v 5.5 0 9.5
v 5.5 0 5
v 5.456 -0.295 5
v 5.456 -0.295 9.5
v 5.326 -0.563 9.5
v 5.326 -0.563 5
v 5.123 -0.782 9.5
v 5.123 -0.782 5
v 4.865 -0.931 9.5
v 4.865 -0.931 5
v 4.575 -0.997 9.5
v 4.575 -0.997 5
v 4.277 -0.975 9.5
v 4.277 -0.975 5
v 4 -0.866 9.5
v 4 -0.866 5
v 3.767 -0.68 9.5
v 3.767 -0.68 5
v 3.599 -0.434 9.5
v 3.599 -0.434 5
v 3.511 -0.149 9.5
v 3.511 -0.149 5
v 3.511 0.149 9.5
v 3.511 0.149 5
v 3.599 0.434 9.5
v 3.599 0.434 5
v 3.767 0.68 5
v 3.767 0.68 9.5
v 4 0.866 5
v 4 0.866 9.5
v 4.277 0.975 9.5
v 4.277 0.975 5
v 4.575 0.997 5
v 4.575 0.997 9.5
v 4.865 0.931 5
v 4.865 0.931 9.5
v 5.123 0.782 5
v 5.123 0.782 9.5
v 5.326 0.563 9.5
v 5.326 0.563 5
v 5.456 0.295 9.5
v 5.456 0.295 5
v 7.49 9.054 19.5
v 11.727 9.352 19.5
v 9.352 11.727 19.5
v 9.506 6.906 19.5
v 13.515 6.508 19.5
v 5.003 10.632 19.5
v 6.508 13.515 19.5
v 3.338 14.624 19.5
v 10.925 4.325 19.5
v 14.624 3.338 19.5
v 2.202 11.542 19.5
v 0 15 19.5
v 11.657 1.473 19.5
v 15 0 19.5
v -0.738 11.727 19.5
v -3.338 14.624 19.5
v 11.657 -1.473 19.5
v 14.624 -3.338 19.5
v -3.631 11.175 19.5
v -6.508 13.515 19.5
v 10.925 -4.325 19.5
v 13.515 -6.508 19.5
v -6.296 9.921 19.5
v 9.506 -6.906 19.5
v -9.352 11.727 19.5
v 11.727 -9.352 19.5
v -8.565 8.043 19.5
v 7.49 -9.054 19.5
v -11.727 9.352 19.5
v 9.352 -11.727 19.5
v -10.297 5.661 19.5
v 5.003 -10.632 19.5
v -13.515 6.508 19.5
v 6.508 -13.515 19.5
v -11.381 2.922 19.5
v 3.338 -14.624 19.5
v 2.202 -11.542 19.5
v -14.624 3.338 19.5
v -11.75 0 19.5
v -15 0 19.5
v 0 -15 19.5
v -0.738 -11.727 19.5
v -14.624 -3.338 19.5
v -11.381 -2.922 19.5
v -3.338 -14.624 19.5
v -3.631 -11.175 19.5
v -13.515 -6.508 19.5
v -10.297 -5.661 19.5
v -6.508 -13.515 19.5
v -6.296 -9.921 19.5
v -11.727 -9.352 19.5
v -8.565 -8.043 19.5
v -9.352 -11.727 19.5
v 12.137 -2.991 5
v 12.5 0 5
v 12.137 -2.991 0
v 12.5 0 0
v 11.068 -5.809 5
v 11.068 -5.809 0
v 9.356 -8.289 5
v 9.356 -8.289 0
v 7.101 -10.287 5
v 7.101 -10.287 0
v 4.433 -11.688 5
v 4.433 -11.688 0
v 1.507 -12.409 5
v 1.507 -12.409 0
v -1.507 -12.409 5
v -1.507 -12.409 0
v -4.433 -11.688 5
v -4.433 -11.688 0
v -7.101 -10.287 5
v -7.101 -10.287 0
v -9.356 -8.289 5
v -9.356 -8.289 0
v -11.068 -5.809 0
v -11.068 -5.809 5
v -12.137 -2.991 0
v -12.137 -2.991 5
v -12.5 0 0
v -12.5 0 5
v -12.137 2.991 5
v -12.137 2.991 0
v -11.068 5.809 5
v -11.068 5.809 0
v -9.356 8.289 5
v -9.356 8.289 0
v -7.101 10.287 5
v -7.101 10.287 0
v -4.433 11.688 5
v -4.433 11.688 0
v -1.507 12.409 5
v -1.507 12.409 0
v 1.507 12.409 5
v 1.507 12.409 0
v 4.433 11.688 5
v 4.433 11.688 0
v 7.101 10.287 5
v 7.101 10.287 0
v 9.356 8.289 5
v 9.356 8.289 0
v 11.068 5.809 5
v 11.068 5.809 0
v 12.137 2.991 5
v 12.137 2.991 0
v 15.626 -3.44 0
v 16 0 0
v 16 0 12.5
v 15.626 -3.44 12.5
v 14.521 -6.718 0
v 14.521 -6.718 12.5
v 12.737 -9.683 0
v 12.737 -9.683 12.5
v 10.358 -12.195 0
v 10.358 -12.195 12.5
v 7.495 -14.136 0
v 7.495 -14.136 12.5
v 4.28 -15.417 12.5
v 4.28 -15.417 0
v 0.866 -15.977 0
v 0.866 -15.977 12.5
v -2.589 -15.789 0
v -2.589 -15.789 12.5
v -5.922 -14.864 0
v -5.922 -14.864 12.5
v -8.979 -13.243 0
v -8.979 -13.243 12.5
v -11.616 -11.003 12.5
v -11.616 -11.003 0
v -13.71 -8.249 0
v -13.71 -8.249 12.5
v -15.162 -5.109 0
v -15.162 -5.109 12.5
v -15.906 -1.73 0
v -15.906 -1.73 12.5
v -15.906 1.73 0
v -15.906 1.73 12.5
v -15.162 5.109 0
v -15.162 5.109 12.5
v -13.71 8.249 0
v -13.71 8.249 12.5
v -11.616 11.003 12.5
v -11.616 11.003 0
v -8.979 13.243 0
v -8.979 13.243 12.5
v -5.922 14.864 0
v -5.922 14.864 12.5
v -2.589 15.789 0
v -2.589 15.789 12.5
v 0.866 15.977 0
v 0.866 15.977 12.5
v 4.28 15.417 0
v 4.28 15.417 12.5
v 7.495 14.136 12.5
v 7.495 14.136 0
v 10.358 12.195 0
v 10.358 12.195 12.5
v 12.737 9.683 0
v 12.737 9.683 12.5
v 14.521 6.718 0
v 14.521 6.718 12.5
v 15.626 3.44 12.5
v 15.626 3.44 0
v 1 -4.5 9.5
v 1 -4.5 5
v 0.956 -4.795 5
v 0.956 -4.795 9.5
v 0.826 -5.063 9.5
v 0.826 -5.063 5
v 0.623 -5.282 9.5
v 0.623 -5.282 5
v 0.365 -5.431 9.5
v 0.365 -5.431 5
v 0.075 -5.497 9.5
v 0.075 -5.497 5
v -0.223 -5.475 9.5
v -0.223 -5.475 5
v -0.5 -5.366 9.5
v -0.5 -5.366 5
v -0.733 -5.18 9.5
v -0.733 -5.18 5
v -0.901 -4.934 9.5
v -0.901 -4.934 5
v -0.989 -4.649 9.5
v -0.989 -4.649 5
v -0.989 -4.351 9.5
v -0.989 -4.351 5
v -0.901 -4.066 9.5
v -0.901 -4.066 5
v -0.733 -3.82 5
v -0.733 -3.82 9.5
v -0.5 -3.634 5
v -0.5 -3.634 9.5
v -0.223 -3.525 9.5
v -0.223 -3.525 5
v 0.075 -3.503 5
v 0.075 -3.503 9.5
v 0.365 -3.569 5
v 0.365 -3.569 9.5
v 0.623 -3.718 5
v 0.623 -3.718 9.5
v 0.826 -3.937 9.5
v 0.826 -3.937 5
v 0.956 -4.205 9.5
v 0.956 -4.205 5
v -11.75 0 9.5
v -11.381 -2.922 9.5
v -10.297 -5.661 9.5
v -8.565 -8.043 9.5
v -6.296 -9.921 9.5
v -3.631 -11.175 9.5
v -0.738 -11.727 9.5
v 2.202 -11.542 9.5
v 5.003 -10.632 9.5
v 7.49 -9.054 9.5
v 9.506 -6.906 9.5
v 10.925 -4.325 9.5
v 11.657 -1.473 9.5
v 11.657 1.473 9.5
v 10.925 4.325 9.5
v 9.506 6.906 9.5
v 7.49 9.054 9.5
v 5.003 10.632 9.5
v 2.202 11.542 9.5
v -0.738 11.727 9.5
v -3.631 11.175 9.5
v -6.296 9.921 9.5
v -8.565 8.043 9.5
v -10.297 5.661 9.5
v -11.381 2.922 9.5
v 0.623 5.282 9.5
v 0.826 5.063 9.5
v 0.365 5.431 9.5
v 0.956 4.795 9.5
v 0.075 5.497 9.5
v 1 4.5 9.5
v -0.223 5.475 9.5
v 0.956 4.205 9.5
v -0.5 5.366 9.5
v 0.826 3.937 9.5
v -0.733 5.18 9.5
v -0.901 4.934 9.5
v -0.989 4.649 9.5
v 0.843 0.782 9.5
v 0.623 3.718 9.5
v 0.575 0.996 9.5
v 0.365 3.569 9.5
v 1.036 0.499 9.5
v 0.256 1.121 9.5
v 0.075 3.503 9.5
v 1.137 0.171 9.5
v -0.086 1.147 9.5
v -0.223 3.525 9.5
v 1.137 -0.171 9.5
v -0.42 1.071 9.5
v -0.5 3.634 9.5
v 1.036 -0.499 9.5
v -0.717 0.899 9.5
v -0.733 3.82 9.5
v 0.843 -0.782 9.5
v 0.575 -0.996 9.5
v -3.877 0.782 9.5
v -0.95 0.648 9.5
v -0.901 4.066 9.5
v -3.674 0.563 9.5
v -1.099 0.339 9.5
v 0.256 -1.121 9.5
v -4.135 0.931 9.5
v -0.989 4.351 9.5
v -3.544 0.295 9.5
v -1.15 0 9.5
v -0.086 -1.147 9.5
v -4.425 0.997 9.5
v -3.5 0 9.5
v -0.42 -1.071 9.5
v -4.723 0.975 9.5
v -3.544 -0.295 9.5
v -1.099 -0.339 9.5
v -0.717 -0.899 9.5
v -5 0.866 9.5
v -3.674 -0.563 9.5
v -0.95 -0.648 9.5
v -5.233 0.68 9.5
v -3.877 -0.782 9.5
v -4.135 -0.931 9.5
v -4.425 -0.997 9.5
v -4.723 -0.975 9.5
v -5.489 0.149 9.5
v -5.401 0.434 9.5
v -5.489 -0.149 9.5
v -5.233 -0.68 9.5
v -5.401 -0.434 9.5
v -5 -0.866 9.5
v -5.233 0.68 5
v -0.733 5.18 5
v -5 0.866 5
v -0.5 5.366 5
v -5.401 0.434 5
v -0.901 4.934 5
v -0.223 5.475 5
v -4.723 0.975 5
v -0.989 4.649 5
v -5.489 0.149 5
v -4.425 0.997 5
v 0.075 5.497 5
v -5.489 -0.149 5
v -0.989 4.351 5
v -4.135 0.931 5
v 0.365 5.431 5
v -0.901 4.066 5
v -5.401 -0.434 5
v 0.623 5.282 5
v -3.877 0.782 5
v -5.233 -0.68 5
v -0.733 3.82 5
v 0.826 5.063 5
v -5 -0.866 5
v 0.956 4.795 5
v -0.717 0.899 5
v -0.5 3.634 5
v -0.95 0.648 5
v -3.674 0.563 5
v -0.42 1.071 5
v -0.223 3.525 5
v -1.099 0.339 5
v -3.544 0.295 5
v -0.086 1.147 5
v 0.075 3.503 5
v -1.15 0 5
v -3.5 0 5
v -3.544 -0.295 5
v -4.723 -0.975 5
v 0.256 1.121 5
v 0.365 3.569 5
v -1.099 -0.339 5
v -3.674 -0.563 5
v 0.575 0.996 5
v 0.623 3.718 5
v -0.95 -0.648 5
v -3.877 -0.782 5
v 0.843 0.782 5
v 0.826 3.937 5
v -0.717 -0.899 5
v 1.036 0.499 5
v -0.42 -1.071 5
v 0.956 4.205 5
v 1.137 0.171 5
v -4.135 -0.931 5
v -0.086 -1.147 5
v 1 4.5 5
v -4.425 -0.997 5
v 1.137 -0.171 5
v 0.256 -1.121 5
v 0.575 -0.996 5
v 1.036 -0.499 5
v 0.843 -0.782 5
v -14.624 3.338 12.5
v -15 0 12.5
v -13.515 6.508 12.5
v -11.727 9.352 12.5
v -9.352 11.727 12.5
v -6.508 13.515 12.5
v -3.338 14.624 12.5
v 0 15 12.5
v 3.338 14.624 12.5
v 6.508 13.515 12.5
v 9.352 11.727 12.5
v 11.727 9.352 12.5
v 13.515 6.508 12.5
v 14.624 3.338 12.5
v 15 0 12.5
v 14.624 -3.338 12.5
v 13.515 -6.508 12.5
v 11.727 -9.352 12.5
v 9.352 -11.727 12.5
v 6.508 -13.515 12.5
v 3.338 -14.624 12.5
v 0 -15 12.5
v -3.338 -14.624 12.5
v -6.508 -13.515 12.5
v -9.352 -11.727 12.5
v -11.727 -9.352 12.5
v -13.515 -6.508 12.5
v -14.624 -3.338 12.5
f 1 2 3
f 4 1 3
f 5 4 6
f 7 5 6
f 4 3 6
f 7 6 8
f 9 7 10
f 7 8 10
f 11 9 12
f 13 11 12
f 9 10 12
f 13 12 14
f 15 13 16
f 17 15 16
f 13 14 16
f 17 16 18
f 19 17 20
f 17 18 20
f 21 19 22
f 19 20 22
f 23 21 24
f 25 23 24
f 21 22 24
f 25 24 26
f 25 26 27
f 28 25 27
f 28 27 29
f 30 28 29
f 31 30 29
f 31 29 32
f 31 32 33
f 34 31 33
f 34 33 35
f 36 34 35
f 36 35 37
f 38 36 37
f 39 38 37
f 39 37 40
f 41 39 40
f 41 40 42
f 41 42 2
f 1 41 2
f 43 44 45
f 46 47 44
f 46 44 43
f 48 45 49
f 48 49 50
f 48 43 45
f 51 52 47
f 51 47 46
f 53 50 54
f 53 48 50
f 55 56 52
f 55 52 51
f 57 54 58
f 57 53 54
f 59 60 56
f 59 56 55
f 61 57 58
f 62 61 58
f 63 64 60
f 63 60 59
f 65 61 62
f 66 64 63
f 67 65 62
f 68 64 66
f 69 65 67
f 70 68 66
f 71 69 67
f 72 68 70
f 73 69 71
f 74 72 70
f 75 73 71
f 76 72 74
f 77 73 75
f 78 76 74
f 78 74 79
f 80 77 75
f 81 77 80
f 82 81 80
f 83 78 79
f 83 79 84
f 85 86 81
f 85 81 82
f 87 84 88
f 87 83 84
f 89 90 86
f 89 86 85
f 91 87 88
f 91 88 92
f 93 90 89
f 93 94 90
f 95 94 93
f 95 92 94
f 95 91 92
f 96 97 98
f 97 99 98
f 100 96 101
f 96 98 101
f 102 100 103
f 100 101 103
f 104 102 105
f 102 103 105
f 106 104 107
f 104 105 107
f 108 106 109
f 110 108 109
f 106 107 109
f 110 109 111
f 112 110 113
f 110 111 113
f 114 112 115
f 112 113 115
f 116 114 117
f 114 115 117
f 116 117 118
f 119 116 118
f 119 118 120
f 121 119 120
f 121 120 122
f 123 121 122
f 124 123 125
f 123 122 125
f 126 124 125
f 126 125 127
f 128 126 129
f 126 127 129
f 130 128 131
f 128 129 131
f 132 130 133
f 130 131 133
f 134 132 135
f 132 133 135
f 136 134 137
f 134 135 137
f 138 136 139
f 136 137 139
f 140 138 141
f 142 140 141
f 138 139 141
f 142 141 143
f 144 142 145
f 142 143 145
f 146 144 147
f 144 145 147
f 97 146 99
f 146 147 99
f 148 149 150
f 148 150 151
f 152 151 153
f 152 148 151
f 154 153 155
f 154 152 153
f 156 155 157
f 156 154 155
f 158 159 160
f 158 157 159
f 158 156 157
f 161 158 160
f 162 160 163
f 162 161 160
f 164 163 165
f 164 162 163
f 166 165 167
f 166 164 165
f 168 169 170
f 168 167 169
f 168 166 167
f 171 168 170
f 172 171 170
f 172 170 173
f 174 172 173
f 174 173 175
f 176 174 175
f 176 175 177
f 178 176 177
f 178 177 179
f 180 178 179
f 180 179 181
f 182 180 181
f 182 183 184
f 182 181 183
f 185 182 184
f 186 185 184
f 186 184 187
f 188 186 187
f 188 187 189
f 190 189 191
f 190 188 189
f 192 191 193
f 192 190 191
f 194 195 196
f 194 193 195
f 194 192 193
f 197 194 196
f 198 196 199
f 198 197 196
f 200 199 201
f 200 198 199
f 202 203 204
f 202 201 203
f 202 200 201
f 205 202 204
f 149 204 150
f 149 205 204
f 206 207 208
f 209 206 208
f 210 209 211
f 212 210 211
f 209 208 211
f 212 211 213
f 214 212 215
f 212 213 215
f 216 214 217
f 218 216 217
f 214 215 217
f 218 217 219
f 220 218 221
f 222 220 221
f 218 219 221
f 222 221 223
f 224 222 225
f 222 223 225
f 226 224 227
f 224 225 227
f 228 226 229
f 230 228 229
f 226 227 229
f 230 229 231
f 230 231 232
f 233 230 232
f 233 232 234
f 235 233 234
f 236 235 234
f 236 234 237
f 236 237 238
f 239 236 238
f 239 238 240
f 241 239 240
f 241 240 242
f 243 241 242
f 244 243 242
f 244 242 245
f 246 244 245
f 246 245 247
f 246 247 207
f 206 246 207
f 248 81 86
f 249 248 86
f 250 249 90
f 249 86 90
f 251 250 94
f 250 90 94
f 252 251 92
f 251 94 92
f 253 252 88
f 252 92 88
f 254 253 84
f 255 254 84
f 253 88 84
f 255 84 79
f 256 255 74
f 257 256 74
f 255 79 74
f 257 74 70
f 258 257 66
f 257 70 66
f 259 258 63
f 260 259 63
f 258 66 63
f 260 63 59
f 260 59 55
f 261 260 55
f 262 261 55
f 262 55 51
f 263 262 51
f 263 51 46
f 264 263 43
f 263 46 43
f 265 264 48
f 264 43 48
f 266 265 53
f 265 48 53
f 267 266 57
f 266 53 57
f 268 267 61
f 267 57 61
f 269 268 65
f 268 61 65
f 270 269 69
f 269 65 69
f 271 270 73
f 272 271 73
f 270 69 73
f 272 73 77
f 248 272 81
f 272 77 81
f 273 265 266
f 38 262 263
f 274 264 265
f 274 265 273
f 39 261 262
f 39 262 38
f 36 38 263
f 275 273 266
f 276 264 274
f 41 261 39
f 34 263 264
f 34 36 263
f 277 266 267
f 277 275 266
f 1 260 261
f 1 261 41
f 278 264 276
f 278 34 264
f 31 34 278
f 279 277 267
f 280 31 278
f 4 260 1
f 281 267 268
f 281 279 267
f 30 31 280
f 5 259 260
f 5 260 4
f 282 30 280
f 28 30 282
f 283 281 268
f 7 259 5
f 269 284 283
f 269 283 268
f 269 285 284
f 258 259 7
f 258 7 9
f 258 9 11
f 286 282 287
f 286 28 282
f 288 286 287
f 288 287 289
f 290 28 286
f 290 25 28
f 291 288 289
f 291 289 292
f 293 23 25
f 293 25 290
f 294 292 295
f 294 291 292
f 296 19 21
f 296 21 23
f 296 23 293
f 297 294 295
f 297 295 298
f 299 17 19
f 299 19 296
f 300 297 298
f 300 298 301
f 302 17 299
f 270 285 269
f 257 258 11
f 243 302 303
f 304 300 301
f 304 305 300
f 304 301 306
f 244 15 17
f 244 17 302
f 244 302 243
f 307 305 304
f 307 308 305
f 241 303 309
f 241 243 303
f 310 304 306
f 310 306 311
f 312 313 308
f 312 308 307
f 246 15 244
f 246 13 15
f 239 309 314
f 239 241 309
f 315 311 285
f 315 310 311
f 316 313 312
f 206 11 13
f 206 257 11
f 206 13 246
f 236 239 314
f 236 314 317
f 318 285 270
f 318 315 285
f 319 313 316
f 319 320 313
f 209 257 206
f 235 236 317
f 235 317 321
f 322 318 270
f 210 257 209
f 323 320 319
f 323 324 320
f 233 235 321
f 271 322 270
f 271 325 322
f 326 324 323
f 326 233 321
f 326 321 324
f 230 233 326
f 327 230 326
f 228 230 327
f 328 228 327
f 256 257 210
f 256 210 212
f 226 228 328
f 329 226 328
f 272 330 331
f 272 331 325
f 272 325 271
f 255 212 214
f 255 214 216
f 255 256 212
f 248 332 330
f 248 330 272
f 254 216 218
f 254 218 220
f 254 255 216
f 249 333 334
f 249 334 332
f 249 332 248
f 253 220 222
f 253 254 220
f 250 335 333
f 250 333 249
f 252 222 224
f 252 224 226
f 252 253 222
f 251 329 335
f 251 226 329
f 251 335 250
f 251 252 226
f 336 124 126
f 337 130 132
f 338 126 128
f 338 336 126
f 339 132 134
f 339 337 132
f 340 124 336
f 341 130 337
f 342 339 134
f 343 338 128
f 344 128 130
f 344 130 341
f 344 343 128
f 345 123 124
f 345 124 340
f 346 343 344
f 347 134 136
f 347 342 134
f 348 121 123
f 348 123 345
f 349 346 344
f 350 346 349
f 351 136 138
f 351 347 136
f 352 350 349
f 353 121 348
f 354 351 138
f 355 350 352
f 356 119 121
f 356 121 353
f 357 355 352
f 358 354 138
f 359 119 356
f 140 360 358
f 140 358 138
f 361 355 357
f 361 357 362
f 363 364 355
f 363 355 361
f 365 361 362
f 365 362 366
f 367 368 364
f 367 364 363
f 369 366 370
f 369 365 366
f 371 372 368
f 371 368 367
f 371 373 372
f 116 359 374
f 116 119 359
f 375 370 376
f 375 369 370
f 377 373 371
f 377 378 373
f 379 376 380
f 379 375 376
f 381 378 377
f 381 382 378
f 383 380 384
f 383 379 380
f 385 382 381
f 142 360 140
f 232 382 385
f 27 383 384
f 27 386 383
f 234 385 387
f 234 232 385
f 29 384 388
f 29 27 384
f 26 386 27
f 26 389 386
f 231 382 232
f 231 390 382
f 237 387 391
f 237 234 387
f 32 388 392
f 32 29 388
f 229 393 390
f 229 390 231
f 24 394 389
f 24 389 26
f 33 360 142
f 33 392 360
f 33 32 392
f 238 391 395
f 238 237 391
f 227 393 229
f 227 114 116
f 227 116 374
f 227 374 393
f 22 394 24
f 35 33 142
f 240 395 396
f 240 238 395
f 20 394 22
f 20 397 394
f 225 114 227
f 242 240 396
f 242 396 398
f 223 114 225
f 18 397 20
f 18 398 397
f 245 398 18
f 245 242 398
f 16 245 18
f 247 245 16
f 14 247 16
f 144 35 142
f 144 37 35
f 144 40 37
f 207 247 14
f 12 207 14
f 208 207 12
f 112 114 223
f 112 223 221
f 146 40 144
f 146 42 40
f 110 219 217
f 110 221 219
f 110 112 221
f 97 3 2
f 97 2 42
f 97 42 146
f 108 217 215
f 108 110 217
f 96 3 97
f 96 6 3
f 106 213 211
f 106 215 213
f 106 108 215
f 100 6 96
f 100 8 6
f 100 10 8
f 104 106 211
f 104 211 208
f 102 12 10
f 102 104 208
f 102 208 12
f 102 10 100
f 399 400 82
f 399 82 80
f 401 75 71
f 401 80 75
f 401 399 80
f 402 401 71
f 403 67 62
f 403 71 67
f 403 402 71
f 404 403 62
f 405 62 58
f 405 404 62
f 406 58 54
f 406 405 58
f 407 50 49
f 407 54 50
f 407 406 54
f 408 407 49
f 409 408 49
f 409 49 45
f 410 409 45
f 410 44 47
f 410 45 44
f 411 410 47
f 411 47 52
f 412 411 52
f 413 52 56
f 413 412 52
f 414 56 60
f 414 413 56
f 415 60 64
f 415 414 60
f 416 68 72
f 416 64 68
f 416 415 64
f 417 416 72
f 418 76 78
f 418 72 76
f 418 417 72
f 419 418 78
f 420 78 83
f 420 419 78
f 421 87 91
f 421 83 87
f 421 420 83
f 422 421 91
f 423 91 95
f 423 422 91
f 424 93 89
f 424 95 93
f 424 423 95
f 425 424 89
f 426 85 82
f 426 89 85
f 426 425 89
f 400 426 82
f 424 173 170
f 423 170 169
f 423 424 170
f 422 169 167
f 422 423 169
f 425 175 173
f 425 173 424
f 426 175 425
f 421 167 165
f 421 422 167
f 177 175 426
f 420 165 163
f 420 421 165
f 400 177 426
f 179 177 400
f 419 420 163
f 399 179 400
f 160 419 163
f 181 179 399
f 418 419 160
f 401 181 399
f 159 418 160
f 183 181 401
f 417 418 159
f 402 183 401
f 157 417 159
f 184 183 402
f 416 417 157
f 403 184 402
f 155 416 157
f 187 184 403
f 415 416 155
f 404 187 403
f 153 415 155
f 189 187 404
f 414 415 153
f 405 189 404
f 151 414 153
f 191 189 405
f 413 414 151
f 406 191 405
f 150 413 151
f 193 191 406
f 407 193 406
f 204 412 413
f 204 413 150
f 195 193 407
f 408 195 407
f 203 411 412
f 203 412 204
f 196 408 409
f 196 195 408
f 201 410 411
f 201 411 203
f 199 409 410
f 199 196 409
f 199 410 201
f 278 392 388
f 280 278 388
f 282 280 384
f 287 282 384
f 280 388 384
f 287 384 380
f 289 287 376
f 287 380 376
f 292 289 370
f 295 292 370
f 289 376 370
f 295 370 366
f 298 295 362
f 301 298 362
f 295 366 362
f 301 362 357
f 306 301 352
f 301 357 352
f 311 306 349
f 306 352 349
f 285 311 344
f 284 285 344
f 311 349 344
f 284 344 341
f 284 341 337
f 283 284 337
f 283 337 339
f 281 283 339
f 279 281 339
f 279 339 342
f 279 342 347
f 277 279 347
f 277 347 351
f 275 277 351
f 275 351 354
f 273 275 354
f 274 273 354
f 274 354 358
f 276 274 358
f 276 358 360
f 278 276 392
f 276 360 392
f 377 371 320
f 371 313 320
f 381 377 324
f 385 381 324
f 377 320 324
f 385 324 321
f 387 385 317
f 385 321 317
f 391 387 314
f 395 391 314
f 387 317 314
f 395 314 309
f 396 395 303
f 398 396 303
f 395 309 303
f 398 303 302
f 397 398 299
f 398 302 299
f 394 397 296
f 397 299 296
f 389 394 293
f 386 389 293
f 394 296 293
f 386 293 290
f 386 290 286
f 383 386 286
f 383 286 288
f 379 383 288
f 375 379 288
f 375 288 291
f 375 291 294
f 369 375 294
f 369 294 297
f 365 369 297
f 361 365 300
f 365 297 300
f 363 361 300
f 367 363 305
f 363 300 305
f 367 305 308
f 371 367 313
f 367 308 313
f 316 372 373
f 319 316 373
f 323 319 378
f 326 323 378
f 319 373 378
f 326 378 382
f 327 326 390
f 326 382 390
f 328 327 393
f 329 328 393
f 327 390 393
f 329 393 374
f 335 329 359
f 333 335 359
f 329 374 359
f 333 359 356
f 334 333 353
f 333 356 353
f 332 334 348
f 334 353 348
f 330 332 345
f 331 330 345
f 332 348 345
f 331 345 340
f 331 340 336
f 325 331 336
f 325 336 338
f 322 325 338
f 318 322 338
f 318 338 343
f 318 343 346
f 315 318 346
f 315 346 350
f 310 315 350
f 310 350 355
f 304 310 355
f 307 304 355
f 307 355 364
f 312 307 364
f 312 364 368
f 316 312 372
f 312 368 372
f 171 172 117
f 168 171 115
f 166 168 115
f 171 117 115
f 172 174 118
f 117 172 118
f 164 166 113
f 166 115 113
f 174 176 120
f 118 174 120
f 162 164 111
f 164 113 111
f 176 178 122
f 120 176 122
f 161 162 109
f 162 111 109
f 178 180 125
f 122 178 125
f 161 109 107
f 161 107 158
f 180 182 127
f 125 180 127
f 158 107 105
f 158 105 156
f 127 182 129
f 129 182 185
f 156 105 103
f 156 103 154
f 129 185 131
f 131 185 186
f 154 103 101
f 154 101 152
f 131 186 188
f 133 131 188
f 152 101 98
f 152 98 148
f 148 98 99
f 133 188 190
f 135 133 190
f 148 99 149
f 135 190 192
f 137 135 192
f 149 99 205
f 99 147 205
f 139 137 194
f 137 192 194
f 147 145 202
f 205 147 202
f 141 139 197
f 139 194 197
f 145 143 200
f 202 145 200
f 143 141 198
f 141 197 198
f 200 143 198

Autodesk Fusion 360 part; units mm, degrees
sketch "Skizze2" plane through (0, 0, 0) normal (0, 0, 1) x (1, 0, 0)
  circle A0 centre (0, 0) radius 16
  dimension "d2" = 32
extrude "Extrusion1" add sketch "Skizze2" along normal blind 12.5
sketch "Skizze3" plane through (0, 0, 12.5) normal (0, 0, 1) x (-1, 0, 0)
  circle A0 centre (0, 0) radius 16
  circle A1 centre (0, 0) radius 15
  dimension "d5" = 30
extrude "Extrusion2" add sketch "Skizze3" along normal blind 7 contours A1
sketch "Skizze4" plane through (0, 0, 19.5) normal (0, 0, 1) x (-1, 0, 0)
  circle A0 centre (0, 0) radius 15
  circle A1 centre (0, 0) radius 11.75
  dimension "d8" = 23.5
extrude "Extrusion3" cut sketch "Skizze4" against normal blind 10 contours A1
sketch "Skizze5" plane through (0, 0, 9.5) normal (0, 0, 1) x (-1, 0, 0)
  circle A0 centre (0, 0) radius 11.75
  circle A1 centre (0, 0) radius 1.15
  dimension "d11" = 2.3
extrude "Extrusion4" cut sketch "Skizze5" against normal blind 300 contours A1
sketch "Skizze6" plane through (0, 0, 0) normal (0, 0, -1) x (1, 0, 0)
  circle A0 centre (0, 0) radius 1.15
  circle A1 centre (0, 0) radius 16
  circle A2 centre (0, 0) radius 12.5
  dimension "d14" = 25
extrude "Extrusion5" cut sketch "Skizze6" against normal blind 5 contours A2
sketch "Skizze7" plane through (0, 0, 5) normal (0, 0, -1) x (1, 0, 0)
  circle A0 centre (0, 0) radius 1.15
  circle A1 centre (0, 0) radius 12.5
  circle A2 centre (0, -4.5) radius 1
  dimension "d17" = 2
extrude "Extrusion6" cut sketch "Skizze7" against normal blind 300 contours A2
sketch "Skizze8" plane through (0, 0, 5) normal (0, 0, -1) x (1, 0, 0)
  circle A0 centre (0, -4.5) radius 1
  circle A1 centre (0, 0) radius 1.15
  circle A2 centre (0, 0) radius 12.5
  circle A3 centre (4.5, 0) radius 1
  dimension "d20" = 2
extrude "Extrusion7" cut sketch "Skizze8" against normal blind 300 contours A3
sketch "Skizze9" plane through (0, 0, 5) normal (0, 0, -1) x (1, 0, 0)
  circle A0 centre (4.5, 0) radius 1
  circle A1 centre (0, -4.5) radius 1
  circle A2 centre (0, 0) radius 1.15
  circle A3 centre (0, 0) radius 12.5
  circle A4 centre (0, 4.5) radius 1
  dimension "d23" = 2
extrude "Extrusion8" cut sketch "Skizze9" against normal blind 300 contours A4
sketch "Skizze10" plane through (0, 0, 5) normal (0, 0, -1) x (1, 0, 0)
  circle A0 centre (0, 4.5) radius 1
  circle A1 centre (4.5, 0) radius 1
  circle A2 centre (0, -4.5) radius 1
  circle A3 centre (0, 0) radius 1.15
  circle A4 centre (0, 0) radius 12.5
  circle A5 centre (-4.5, 0) radius 1
  dimension "d26" = 2
extrude "Extrusion9" cut sketch "Skizze10" against normal blind 300 contours A5
